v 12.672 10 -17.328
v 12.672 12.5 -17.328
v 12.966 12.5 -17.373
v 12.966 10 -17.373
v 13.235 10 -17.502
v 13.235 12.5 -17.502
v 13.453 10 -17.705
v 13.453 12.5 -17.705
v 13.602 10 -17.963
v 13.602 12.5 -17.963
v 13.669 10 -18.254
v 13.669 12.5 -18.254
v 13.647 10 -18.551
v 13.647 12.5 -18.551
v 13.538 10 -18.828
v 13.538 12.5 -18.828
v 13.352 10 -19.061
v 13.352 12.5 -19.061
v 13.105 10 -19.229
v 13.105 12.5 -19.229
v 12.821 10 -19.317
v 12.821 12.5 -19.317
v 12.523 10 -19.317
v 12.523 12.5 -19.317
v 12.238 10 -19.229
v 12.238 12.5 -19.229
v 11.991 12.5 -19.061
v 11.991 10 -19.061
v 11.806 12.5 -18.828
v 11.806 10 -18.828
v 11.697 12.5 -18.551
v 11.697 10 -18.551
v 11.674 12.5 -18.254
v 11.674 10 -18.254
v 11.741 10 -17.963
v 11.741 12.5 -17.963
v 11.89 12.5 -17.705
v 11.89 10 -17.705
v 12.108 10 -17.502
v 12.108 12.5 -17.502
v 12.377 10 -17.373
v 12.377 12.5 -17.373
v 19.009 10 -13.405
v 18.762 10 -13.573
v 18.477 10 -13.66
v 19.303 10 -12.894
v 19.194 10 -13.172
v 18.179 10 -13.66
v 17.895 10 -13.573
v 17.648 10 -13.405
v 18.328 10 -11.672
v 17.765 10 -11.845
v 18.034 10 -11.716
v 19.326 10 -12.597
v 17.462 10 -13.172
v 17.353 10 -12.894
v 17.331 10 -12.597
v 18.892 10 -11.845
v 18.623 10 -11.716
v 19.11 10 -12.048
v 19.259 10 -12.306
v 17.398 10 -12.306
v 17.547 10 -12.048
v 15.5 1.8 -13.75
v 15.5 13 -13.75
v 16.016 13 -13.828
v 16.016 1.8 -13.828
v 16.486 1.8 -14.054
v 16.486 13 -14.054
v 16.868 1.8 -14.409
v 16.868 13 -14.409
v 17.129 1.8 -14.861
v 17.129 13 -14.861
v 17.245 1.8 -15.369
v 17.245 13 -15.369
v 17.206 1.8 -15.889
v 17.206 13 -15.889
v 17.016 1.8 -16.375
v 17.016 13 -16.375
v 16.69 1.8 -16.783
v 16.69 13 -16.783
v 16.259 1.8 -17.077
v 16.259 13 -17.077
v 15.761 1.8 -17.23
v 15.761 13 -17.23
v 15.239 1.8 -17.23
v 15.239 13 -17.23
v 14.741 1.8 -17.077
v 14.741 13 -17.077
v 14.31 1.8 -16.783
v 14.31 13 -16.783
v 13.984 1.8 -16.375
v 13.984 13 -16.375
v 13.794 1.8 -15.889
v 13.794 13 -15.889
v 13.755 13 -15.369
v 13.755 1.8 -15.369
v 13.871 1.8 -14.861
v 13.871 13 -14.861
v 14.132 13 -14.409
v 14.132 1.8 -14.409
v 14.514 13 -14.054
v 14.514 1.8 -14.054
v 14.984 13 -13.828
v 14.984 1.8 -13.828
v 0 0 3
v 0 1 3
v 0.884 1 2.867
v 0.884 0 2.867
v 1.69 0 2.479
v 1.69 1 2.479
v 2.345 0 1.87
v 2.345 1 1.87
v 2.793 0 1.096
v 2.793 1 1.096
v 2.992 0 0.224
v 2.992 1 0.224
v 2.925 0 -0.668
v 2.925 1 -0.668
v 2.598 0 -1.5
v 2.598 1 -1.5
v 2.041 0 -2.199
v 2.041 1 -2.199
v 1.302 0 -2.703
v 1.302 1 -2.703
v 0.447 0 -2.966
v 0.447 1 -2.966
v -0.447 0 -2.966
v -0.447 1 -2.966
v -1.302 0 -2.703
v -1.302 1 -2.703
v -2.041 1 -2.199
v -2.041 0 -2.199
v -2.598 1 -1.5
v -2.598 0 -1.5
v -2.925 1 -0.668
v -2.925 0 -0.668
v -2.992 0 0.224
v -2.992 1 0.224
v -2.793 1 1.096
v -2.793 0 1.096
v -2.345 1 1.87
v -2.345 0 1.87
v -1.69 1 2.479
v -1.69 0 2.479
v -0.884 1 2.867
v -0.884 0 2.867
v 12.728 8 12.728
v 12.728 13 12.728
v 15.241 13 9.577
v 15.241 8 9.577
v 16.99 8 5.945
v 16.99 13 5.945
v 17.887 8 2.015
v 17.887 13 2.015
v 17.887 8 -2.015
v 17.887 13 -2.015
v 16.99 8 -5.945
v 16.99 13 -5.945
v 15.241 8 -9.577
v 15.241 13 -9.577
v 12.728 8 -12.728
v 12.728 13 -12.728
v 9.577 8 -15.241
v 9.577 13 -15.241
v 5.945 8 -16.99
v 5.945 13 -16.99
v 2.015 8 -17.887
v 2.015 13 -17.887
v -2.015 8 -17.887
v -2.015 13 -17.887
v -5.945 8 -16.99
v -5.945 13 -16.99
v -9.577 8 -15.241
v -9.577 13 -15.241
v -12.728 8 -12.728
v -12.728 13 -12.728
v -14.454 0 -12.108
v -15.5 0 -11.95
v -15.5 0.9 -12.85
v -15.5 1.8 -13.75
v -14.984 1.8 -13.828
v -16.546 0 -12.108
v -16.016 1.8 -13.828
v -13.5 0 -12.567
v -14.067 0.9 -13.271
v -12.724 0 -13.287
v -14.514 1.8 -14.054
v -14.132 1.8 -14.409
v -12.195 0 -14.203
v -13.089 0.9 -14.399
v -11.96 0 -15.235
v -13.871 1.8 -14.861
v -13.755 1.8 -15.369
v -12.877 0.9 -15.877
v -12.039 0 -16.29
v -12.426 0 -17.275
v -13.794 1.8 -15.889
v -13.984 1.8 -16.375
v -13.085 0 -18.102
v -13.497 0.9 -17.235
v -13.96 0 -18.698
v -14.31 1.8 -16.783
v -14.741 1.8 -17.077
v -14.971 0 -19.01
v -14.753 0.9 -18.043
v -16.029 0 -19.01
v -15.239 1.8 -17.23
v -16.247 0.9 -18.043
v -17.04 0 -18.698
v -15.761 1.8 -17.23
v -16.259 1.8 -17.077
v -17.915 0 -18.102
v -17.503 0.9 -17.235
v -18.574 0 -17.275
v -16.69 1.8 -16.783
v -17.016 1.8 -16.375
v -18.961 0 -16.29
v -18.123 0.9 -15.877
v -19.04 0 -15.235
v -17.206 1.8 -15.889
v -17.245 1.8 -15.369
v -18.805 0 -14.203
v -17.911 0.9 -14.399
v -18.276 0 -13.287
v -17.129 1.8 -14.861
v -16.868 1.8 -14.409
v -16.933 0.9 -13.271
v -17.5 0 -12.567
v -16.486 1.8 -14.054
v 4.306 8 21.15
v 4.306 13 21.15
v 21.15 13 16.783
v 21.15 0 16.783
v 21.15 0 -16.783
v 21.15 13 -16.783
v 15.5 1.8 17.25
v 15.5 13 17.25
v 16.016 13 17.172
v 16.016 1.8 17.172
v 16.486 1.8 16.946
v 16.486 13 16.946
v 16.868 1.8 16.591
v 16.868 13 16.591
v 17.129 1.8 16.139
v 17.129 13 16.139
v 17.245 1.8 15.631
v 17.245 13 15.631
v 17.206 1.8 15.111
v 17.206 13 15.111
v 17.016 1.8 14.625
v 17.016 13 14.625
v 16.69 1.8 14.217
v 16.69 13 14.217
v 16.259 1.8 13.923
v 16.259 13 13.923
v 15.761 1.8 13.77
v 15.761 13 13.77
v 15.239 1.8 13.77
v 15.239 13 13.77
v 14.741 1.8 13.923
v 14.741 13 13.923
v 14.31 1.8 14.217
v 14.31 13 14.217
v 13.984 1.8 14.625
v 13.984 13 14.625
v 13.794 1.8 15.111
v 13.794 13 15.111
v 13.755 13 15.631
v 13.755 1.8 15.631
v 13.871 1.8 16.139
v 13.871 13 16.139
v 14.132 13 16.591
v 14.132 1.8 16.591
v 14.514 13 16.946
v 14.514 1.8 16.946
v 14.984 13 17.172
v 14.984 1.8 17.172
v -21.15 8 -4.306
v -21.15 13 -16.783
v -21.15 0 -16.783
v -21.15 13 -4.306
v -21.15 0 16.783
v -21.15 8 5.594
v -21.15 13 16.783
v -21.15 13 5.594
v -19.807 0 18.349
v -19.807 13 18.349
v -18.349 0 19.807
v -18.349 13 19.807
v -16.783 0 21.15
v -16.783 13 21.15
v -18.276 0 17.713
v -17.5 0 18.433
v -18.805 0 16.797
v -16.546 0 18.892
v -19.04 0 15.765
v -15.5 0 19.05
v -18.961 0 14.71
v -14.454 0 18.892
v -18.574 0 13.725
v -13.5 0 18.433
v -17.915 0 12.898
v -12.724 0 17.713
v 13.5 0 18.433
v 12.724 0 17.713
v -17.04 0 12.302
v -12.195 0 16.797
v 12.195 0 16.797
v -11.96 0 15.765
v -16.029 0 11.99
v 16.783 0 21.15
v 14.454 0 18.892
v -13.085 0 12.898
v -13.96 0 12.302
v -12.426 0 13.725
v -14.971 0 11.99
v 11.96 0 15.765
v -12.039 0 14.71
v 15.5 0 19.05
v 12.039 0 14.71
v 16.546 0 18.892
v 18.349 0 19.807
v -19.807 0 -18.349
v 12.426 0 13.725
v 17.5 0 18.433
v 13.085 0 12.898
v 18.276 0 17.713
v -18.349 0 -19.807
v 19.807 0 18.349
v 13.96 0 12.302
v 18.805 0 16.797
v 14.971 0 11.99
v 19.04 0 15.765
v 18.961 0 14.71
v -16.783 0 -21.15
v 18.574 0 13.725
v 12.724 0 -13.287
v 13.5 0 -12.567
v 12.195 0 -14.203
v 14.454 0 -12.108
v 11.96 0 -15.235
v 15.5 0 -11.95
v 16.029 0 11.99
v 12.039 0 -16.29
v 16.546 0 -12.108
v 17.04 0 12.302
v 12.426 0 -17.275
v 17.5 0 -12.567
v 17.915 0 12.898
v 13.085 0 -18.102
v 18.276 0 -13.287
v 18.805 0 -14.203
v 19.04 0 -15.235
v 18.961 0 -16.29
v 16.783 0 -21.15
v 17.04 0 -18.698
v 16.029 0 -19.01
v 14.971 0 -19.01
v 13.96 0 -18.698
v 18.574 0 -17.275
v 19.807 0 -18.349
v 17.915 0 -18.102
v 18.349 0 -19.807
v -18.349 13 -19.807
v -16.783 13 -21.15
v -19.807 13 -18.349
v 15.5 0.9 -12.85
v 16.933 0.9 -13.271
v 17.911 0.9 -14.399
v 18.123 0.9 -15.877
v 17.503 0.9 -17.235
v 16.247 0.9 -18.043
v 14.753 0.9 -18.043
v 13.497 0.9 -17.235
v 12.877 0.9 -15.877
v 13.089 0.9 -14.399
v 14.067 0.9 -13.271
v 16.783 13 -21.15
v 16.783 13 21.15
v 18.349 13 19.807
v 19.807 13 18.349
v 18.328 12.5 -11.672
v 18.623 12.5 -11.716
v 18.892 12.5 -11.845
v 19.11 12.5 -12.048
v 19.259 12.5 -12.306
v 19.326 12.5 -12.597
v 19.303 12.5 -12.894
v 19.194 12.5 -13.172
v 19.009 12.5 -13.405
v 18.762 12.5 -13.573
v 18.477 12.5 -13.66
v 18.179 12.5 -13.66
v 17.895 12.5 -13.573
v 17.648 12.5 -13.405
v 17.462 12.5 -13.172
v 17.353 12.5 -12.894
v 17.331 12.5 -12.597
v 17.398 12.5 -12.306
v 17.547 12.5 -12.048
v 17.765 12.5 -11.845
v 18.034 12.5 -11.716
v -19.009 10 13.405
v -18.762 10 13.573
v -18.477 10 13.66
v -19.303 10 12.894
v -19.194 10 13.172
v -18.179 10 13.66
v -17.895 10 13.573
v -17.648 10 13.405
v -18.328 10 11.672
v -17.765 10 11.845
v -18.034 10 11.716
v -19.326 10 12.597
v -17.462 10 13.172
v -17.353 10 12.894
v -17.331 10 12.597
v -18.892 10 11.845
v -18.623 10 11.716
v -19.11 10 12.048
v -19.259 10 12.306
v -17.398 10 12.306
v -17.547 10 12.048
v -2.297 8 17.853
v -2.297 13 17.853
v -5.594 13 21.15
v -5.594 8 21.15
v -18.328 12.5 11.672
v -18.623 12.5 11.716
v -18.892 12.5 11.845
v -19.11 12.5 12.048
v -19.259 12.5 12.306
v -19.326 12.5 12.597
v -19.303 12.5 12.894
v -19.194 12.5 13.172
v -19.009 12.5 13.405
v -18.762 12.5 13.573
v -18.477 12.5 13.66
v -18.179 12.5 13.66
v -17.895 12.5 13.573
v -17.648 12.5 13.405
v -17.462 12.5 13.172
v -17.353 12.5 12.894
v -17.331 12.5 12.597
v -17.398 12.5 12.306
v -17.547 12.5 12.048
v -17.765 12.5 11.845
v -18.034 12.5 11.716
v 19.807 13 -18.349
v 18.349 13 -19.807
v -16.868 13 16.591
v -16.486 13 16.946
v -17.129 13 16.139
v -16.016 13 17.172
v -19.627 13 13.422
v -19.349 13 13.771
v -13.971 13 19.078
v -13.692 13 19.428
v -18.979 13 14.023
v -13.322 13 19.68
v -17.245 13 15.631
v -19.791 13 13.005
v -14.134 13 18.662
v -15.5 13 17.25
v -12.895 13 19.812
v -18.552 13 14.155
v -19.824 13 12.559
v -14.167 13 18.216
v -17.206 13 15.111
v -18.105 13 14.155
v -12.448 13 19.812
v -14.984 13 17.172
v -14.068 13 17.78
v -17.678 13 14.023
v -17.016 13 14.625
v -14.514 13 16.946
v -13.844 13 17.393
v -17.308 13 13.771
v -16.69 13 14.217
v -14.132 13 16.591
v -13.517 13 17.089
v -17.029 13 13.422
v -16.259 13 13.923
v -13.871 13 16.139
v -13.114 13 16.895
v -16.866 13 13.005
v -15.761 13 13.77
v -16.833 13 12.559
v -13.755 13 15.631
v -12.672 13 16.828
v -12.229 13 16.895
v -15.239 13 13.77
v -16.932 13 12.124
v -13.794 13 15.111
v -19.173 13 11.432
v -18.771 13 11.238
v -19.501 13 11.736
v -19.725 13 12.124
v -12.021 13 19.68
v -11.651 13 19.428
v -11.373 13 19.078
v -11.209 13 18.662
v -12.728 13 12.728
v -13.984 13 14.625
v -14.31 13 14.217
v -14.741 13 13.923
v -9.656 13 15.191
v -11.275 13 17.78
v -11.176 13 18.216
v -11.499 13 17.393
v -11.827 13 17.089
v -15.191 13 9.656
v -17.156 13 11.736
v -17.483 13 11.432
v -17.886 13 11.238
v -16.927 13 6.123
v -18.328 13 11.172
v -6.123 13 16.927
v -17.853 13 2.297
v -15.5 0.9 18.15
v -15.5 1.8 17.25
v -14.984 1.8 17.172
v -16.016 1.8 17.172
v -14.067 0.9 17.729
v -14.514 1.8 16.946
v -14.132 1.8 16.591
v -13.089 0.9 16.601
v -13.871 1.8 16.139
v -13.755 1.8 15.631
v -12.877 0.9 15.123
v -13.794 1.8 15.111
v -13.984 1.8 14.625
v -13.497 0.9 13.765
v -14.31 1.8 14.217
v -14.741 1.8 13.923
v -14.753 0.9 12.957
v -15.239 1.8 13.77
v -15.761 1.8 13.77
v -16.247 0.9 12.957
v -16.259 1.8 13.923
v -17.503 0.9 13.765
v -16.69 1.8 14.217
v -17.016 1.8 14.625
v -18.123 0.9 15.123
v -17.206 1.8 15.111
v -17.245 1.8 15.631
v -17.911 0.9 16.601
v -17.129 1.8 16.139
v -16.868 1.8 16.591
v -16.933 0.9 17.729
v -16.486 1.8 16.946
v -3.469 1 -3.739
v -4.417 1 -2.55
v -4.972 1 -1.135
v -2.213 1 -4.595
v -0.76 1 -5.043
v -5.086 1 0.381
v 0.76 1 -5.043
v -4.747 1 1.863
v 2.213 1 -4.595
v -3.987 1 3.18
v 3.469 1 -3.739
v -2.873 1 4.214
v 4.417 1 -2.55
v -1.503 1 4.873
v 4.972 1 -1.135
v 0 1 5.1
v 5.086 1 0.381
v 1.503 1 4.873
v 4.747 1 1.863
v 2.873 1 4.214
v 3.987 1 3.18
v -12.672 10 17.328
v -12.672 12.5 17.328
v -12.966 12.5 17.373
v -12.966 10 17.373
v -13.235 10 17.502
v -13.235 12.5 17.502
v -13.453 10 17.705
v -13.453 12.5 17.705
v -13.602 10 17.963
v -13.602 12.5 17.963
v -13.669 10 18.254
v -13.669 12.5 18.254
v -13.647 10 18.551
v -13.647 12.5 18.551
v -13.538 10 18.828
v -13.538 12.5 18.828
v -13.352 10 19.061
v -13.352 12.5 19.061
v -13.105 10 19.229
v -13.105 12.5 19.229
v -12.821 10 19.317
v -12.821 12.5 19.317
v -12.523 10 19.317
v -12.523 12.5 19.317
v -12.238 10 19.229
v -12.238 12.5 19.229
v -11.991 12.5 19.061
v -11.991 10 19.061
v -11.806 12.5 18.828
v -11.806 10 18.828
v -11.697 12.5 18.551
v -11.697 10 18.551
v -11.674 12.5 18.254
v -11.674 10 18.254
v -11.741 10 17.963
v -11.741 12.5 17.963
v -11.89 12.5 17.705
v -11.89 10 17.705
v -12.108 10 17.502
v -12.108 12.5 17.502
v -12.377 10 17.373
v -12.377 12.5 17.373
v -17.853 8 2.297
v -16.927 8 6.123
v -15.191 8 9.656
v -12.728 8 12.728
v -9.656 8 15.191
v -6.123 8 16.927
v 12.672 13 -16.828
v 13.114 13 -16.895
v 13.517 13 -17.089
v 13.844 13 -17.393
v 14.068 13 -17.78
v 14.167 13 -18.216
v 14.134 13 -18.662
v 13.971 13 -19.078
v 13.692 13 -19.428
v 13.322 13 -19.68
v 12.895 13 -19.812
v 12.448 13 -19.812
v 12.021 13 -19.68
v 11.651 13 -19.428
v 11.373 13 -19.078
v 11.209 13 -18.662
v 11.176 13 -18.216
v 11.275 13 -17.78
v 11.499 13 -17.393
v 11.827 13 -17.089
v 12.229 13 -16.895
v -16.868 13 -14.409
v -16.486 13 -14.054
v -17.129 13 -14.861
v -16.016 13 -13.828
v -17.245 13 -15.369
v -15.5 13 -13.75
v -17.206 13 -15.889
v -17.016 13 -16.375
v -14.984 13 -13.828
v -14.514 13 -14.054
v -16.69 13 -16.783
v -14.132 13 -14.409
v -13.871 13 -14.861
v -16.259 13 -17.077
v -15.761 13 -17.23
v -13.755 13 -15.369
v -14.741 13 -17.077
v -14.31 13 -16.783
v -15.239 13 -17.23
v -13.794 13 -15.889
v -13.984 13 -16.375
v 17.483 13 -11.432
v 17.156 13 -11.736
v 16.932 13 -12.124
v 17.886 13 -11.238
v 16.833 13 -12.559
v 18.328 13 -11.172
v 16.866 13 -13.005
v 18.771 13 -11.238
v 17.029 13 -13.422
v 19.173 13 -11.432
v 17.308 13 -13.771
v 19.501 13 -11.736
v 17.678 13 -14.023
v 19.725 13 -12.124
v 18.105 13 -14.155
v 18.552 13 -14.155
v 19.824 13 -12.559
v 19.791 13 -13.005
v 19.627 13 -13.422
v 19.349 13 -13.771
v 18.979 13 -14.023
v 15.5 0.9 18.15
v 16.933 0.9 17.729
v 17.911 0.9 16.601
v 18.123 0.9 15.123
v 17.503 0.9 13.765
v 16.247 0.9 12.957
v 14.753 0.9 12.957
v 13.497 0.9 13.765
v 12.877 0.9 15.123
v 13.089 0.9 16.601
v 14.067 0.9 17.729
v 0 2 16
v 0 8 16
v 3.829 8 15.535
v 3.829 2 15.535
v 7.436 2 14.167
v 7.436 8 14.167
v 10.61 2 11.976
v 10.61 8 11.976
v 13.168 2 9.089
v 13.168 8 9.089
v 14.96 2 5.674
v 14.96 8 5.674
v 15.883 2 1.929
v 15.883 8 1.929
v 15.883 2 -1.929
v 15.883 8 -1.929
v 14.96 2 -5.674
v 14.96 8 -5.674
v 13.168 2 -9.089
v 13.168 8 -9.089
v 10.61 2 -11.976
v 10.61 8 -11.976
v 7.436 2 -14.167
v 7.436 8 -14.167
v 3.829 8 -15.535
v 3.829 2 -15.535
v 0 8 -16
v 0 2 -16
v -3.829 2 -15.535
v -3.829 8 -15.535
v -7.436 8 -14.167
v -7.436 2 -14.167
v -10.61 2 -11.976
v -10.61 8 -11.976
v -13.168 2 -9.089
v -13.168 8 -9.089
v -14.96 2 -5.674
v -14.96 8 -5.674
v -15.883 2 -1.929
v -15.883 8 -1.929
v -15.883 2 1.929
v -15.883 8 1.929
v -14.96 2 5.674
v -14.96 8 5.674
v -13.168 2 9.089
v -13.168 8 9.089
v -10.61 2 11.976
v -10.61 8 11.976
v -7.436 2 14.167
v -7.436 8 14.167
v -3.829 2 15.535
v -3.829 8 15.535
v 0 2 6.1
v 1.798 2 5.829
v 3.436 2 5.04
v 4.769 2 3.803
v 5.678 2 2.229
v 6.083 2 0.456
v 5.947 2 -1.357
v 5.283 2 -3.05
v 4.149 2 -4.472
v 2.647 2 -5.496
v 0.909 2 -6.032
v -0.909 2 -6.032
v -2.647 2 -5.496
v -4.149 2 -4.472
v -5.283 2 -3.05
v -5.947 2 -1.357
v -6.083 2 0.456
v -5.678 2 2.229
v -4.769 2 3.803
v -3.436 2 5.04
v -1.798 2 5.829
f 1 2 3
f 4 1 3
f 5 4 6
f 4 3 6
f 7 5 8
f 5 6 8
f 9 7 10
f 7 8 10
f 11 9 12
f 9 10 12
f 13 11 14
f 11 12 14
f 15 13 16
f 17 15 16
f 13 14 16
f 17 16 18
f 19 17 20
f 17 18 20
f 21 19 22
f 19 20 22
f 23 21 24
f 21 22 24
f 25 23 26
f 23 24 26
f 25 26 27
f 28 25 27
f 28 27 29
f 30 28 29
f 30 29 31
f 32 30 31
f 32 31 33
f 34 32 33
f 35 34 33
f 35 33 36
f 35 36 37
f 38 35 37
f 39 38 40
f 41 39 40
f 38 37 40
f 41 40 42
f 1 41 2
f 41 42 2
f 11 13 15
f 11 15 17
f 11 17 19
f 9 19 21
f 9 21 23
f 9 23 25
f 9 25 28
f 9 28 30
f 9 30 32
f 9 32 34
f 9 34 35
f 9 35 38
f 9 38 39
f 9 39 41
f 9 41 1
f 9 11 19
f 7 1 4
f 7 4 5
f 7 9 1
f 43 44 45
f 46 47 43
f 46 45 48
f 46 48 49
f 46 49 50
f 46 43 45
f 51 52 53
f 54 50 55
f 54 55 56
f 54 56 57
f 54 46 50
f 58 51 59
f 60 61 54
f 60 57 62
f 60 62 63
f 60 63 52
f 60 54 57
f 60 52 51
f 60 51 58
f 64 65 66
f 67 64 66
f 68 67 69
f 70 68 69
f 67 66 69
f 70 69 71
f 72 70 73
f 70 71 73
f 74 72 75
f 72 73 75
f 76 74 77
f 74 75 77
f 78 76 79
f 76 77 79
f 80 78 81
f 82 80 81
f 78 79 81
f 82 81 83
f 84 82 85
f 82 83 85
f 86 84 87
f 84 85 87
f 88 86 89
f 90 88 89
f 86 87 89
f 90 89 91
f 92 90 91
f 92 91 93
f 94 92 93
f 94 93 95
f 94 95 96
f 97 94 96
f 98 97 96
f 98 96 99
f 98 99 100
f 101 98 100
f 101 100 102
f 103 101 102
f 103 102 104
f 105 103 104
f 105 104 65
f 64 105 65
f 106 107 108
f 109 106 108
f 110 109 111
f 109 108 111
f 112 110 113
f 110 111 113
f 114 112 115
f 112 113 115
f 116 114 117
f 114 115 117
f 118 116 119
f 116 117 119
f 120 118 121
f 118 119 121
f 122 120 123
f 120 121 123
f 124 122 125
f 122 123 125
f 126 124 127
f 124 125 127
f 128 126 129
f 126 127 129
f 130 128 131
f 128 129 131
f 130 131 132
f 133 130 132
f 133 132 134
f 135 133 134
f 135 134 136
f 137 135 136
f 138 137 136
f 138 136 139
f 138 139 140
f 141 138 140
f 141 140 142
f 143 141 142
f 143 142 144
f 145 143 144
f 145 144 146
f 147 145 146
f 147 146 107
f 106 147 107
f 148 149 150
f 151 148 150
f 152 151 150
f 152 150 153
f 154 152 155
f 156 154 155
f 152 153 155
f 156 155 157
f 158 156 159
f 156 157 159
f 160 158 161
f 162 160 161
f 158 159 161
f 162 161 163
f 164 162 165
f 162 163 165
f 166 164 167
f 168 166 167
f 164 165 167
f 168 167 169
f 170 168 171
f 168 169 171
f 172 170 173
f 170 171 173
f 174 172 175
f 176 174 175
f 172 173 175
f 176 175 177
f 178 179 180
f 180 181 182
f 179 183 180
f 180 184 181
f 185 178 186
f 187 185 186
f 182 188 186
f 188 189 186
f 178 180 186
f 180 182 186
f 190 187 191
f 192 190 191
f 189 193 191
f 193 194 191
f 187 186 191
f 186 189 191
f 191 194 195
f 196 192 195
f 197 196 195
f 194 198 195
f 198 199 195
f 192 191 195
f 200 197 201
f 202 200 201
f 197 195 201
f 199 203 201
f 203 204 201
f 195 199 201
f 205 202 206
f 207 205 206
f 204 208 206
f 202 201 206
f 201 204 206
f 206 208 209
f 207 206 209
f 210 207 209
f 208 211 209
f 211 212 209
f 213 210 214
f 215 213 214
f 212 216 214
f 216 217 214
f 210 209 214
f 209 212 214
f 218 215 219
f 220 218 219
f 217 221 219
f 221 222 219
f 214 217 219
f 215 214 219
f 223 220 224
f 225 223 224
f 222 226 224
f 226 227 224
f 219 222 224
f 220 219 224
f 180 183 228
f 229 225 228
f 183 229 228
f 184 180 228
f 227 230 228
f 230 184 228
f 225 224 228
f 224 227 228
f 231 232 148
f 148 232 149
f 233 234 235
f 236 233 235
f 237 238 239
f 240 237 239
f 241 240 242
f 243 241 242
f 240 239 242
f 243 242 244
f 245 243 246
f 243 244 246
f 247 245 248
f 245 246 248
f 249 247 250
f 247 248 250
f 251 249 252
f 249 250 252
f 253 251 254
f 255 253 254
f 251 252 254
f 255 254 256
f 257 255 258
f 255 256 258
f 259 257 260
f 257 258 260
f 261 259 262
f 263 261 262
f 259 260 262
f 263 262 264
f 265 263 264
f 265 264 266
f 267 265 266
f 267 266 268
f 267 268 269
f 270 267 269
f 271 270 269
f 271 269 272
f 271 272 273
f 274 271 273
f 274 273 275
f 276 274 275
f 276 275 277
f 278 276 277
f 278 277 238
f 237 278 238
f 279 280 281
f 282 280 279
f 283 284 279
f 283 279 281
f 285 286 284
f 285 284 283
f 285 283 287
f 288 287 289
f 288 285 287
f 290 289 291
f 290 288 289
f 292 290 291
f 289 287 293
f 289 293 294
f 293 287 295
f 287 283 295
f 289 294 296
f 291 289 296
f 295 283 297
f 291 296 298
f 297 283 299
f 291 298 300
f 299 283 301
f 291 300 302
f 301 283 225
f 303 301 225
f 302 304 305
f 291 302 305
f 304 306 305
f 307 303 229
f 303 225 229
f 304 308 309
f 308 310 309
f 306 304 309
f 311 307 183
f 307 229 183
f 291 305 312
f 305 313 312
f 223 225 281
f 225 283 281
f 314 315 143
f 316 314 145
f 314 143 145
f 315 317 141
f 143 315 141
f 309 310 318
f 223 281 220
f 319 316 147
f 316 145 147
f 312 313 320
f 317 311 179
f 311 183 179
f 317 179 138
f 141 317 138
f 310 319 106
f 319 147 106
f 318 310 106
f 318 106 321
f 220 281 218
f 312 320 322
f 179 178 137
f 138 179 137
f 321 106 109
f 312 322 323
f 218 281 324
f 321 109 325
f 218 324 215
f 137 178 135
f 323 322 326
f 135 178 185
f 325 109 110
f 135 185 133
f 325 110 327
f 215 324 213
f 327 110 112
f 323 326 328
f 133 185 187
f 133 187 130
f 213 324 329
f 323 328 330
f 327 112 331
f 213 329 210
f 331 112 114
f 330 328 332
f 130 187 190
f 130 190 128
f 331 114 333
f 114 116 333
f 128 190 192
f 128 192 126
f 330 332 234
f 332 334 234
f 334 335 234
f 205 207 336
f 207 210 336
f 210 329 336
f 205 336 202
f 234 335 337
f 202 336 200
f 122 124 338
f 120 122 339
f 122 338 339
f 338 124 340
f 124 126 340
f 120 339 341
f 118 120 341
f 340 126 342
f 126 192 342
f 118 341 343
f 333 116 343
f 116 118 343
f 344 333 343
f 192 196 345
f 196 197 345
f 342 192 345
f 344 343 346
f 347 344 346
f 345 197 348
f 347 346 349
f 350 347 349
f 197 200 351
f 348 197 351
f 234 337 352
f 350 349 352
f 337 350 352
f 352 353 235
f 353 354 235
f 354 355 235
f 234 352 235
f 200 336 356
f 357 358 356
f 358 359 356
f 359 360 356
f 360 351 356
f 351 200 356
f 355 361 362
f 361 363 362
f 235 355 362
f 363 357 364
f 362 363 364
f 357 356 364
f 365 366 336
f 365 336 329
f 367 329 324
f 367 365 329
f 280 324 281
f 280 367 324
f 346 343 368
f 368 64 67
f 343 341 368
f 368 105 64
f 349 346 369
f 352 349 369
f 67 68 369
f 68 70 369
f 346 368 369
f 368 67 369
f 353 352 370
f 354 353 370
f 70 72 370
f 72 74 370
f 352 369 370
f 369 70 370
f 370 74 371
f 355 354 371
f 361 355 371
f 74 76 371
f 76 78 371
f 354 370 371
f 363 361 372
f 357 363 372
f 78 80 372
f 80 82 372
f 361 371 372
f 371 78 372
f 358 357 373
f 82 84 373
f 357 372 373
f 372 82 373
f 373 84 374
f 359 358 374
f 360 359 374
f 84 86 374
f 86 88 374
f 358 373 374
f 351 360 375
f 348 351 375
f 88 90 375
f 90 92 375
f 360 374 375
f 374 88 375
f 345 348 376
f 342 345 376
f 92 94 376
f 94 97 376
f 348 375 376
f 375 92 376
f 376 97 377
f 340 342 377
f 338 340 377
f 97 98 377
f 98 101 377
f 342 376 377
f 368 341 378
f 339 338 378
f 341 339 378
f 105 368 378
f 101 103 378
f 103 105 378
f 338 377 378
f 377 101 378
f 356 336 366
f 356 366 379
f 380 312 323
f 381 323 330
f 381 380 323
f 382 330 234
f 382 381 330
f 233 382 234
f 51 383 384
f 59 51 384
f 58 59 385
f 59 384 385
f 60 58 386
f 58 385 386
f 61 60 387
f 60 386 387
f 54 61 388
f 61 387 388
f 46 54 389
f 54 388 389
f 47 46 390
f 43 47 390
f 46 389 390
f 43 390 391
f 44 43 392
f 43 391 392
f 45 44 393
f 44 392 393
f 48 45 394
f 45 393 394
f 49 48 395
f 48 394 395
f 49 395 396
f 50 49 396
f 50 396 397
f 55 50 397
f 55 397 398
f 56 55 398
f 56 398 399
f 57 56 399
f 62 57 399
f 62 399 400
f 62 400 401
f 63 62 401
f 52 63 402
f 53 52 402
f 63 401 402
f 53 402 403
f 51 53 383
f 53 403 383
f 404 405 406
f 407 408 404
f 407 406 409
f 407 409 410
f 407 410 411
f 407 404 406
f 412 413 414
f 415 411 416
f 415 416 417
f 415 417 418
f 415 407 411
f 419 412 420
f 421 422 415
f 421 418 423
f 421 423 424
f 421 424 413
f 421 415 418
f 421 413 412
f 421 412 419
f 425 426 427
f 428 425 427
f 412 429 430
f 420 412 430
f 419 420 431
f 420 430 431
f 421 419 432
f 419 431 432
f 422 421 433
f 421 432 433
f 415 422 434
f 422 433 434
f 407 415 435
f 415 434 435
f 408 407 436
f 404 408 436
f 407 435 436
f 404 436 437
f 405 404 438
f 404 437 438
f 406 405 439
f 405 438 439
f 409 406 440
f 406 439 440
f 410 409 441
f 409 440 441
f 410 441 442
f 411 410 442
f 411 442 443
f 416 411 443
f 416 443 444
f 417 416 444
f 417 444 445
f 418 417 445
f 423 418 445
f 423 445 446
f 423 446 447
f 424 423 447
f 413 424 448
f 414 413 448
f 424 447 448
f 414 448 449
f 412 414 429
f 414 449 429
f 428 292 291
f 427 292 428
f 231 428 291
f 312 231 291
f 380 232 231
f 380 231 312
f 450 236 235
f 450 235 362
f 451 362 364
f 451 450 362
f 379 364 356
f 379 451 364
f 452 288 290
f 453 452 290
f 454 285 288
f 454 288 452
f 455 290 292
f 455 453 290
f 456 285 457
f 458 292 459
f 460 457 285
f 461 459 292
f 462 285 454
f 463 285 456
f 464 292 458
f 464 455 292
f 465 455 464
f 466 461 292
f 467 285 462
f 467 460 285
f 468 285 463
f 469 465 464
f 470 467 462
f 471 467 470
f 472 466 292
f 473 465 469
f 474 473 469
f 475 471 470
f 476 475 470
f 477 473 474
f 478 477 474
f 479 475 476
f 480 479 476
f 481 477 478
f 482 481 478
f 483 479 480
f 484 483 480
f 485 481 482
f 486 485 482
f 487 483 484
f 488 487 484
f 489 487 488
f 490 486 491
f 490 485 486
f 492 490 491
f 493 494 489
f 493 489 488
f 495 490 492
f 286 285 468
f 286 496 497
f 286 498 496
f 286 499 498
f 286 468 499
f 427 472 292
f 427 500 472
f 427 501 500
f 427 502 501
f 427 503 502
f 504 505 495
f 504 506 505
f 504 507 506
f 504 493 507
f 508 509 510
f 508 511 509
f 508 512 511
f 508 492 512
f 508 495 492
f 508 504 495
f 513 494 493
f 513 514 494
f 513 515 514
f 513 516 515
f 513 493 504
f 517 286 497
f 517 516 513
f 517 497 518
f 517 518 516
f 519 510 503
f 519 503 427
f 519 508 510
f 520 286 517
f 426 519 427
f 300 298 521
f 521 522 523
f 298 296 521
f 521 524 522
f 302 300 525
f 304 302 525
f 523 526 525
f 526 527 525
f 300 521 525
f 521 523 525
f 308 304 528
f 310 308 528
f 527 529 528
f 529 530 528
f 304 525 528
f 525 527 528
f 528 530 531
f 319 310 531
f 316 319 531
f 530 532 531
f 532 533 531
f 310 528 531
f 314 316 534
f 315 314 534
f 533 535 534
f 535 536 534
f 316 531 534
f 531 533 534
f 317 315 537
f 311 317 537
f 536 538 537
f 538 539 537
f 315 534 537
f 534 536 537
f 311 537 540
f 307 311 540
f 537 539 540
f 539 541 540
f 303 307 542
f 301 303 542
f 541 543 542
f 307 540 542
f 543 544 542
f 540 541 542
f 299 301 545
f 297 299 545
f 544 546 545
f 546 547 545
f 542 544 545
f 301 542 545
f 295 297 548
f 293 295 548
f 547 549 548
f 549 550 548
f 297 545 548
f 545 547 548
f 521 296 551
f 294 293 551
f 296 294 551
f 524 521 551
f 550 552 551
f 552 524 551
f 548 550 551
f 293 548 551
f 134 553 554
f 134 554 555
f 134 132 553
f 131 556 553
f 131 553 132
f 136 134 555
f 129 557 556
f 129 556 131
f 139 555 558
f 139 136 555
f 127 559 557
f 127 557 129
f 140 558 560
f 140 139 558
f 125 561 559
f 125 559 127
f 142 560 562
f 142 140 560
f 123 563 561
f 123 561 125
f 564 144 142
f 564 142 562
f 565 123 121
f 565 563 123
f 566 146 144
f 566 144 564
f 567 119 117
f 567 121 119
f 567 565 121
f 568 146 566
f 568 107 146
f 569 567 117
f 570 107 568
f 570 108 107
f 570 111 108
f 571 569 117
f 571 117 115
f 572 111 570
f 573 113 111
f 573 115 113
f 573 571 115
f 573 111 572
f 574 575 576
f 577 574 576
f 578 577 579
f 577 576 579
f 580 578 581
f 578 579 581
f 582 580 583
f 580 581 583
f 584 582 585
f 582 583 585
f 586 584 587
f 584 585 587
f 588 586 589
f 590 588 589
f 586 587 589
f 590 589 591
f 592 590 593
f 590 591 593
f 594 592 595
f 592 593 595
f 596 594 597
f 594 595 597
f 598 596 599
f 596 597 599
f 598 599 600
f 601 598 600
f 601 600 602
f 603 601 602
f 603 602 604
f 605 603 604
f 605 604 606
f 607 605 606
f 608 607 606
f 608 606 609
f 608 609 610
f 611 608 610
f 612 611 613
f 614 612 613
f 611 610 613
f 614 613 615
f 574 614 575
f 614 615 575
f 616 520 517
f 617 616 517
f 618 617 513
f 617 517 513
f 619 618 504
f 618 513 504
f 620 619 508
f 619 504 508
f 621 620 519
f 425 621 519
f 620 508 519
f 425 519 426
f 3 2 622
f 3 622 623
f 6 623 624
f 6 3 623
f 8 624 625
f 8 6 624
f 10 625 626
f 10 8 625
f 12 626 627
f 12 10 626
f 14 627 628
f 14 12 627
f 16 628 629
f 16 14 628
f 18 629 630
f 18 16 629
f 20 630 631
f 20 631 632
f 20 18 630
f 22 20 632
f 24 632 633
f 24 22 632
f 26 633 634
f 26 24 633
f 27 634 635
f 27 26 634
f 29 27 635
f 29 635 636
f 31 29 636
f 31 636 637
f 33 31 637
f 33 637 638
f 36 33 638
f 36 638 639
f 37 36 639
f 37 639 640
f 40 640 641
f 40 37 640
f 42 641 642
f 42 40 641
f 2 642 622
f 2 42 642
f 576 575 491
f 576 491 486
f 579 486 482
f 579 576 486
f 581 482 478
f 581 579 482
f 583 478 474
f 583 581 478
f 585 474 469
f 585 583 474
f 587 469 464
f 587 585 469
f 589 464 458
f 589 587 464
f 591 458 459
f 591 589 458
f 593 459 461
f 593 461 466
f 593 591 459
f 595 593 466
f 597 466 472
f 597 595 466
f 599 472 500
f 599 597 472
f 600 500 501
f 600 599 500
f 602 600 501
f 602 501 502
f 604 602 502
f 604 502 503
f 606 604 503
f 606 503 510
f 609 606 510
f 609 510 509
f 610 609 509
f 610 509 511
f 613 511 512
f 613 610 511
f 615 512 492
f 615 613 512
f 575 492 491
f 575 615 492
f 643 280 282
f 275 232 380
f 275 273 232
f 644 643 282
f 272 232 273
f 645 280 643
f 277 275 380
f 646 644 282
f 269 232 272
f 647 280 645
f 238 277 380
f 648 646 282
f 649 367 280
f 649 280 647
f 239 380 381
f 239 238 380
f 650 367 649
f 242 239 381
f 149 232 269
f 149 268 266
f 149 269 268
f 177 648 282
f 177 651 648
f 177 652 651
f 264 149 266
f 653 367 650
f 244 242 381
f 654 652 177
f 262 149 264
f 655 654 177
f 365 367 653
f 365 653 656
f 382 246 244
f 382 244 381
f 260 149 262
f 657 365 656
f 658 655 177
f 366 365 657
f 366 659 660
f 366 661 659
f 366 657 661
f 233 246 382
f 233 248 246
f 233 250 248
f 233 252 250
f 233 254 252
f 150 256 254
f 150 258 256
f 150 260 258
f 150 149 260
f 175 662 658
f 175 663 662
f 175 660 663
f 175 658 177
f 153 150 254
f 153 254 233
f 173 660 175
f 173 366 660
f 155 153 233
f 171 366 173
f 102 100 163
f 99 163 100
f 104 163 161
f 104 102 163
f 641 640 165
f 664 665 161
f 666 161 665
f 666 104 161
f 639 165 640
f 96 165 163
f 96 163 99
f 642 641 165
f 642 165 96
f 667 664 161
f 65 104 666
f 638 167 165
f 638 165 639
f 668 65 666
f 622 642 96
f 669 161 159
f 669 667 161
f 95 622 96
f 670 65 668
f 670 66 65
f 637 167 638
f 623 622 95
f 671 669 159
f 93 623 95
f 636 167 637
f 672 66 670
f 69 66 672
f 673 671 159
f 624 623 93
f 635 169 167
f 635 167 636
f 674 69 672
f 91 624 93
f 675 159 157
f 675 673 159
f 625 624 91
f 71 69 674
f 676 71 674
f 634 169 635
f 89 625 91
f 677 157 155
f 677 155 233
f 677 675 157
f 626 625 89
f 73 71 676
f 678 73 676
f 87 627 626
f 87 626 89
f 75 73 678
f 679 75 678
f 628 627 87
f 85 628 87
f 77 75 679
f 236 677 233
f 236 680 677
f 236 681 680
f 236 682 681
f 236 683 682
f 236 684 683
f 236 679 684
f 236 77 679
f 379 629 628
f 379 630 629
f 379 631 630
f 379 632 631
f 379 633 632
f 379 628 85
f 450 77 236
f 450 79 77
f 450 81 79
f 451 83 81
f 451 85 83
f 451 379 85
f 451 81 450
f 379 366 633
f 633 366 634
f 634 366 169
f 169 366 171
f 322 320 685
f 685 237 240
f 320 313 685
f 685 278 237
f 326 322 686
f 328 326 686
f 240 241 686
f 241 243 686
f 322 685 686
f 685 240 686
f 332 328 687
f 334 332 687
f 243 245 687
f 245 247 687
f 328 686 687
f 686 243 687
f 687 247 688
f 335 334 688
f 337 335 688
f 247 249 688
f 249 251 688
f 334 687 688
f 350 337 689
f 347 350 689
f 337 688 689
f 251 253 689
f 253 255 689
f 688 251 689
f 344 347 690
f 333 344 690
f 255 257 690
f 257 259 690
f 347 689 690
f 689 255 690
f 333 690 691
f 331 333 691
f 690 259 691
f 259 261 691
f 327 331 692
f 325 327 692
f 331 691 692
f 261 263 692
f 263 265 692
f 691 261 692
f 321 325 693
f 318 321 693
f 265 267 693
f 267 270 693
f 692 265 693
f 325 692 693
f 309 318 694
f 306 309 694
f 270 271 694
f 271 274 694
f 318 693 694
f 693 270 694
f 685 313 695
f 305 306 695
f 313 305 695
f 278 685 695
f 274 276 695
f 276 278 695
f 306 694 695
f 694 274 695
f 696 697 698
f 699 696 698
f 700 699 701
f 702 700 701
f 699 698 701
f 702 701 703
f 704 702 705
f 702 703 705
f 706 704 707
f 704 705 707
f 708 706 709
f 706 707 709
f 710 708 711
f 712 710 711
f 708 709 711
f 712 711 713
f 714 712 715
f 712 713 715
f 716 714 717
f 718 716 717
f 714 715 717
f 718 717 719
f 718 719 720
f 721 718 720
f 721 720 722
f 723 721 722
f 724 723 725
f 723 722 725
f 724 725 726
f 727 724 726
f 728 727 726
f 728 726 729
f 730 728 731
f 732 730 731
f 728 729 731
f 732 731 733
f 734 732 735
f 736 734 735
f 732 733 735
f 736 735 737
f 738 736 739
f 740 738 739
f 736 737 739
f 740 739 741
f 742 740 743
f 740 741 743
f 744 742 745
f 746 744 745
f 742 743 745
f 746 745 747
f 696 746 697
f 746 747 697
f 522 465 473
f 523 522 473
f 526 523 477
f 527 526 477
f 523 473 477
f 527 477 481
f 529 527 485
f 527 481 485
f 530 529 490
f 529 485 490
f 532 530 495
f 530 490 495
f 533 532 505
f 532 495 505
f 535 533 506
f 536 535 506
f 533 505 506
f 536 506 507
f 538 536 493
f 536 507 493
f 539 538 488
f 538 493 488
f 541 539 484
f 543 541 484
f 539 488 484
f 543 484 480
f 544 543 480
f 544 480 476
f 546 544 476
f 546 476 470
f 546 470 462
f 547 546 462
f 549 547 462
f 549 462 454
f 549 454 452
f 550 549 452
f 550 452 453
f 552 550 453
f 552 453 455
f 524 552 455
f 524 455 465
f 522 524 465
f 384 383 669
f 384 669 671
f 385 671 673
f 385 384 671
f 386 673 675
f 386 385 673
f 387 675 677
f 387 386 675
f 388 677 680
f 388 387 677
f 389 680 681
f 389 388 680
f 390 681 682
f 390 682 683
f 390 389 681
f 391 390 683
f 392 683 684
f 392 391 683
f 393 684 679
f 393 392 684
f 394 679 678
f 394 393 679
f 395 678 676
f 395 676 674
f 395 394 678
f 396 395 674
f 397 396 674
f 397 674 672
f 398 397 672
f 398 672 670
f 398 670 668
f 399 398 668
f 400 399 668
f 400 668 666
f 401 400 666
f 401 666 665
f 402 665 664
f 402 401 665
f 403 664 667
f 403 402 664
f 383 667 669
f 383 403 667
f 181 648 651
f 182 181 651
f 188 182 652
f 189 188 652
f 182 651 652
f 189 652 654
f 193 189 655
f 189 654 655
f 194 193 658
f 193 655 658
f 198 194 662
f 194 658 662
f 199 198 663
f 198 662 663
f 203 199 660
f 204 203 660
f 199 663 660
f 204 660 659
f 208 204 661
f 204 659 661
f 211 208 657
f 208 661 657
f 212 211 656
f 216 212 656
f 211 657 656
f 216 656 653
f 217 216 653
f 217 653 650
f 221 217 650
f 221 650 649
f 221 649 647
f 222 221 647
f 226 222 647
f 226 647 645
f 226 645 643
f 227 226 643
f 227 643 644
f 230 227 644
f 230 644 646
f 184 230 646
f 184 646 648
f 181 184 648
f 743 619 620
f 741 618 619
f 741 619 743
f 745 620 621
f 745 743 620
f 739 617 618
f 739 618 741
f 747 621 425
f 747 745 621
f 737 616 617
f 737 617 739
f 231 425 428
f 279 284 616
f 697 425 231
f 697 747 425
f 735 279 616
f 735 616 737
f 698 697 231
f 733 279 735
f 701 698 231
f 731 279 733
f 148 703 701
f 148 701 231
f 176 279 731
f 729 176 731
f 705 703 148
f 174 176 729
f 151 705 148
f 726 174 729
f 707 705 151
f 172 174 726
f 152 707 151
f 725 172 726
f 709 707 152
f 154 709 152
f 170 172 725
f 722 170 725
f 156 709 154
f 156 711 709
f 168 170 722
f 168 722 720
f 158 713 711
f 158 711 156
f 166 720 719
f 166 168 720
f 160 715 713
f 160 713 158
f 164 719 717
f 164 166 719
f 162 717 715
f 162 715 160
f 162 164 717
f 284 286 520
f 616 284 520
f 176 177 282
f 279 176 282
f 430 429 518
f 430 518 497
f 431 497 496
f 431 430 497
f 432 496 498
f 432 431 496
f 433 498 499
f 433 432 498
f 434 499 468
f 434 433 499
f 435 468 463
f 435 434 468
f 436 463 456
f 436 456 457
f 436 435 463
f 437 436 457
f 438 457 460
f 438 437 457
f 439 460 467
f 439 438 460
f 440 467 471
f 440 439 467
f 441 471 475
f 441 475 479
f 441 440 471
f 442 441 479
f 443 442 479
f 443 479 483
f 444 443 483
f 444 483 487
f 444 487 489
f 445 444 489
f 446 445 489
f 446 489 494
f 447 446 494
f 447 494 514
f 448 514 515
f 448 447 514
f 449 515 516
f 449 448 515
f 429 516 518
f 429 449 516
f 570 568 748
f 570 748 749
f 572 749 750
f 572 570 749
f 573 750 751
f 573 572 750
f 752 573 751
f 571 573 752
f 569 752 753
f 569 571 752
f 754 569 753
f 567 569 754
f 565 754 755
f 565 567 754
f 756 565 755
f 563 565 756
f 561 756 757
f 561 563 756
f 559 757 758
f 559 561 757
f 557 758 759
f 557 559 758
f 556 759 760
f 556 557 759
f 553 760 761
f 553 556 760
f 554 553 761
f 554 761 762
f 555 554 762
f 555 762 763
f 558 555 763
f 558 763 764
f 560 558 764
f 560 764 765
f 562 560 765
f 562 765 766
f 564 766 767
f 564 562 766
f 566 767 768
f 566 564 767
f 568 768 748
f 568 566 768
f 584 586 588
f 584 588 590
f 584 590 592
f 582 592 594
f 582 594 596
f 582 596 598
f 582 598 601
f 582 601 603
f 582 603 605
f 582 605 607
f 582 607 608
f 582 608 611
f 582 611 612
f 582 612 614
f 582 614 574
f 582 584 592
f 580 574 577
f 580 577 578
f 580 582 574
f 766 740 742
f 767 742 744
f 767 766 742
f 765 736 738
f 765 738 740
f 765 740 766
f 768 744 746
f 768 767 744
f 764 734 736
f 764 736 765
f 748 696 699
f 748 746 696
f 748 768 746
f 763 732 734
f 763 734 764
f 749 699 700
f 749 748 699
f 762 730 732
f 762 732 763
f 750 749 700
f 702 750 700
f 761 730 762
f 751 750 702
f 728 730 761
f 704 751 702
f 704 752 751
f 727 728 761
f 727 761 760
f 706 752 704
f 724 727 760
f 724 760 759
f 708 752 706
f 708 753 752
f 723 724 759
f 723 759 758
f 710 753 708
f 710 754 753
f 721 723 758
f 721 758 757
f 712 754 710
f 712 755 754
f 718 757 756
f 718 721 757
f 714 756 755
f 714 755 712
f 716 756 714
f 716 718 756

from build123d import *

# Parameters (mm, degrees)
SKETCH2_W           = 42.3
SKETCH2_H           = 42.3
BOSS_EXTRUDE1_DEPTH = 13
SKETCH3_R           = 3
CUT_EXTRUDE1_DEPTH  = 33.613570795
SKETCH4_R           = 1.75
CUT_EXTRUDE2_DEPTH  = 33.613570795
SKETCH5_R           = 29.910616844
SKETCH5_R_2         = 27
CUT_EXTRUDE4_DEPTH  = 33.613570795
SKETCH6_R           = 3
CUT_EXTRUDE5_DEPTH  = 11
CHAMFER1_SIZE       = 1.8
SKETCH7_R           = 5.1
CUT_EXTRUDE6_DEPTH  = 1
BOSS_EXTRUDE2_START = 6
SKETCH8_R           = 16
BOSS_EXTRUDE2_DEPTH = 6
CHAMFER2_SIZE       = 1
SKETCH9_R           = 1
CUT_EXTRUDE7_DEPTH  = 3
CHAMFER3_SIZE       = 0.5


with BuildPart() as part:
    # Sketch2 → Boss-Extrude1 (new body)
    with BuildSketch(Plane(origin=(0, 0, 0), x_dir=(1, 0, 0), z_dir=(0, 1, 0))):
        Rectangle(SKETCH2_W, SKETCH2_H)
    extrude(amount=BOSS_EXTRUDE1_DEPTH)

    # Sketch3 → Cut-Extrude1 (cut, through all)
    with BuildSketch(Plane(origin=(0, 13, 0), x_dir=(1, 0, 0), z_dir=(0, 1, 0))):
        with Locations(Location((0, 0, 0), (0, 0, 270))):
            Circle(SKETCH3_R)
    extrude(amount=-CUT_EXTRUDE1_DEPTH, mode=Mode.SUBTRACT)

    # Sketch4 → Cut-Extrude2 (cut, through all)
    with BuildSketch(Plane(origin=(0, 13, 0), x_dir=(1, 0, 0), z_dir=(0, 1, 0))):
        with Locations(Location((-15.5, 15.5, 0), (0, 0, 270))):
            Circle(SKETCH4_R)
        with Locations(Location((15.5, 15.5, 0), (0, 0, 270))):
            Circle(SKETCH4_R)
        with Locations(Location((15.5, -15.5, 0), (0, 0, 270))):
            Circle(SKETCH4_R)
        with Locations(Location((-15.5, -15.5, 0), (0, 0, 270))):
            Circle(SKETCH4_R)
    extrude(amount=-CUT_EXTRUDE2_DEPTH, mode=Mode.SUBTRACT)

    # Sketch5 → Cut-Extrude4 (cut, through all)
    with BuildSketch(Plane(origin=(0, 13, 0), x_dir=(1, 0, 0), z_dir=(0, 1, 0))):
        Circle(SKETCH5_R)
        Circle(SKETCH5_R_2, mode=Mode.SUBTRACT)
    extrude(amount=-CUT_EXTRUDE4_DEPTH, mode=Mode.SUBTRACT)

    # Sketch6 → Cut-Extrude5 (cut)
    with BuildSketch(Plane(origin=(0, 13, 0), x_dir=(1, 0, 0), z_dir=(0, 1, 0))):
        with BuildLine():
            Line((-12.727922061, 12.727922061), (-21.15, 4.305844123))
            Line((-21.15, 4.305844123), (-21.15, -5.593650814))
            Line((-21.15, -5.593650814), (-17.852895433, -2.296546247))
            ThreePointArc((-17.852895433, -2.296546247), (-12.727922061, -12.727922061), (-2.296546247, -17.852895433))
            Line((-2.296546247, -17.852895433), (-5.593650814, -21.15))
            Line((-5.593650814, -21.15), (4.305844123, -21.15))
            Line((4.305844123, -21.15), (12.727922061, -12.727922061))
            ThreePointArc((12.727922061, -12.727922061), (12.727922061, 12.727922061), (-12.727922061, 12.727922061))
        make_face()
        with Locations(Location((0, 0, 0), (0, 0, 270))):
            Circle(SKETCH6_R, mode=Mode.SUBTRACT)
    extrude(amount=-CUT_EXTRUDE5_DEPTH, mode=Mode.SUBTRACT)

    # Chamfer1
    chamfer1_edges = [part.edges().sort_by_distance(p)[0] for p in [
        (-15.5, 0, 13.75),
        (15.5, 0, 13.75),
        (15.5, 0, -17.25),
        (-15.5, 0, -17.25),
    ]]
    chamfer(chamfer1_edges, length=CHAMFER1_SIZE)

    # Sketch7 → Cut-Extrude6 (cut)
    with BuildSketch(Plane(origin=(0, 2, 0), x_dir=(1, 0, 0), z_dir=(0, 1, 0))):
        with Locations(Location((0, 0, 0), (0, 0, 270))):
            Circle(SKETCH7_R)
    extrude(amount=-CUT_EXTRUDE6_DEPTH, mode=Mode.SUBTRACT)

    # Sketch8 → Boss-Extrude2 (add)
    with BuildSketch(Plane(origin=(0, 2, 0), x_dir=(1, 0, 0), z_dir=(0, 1, 0)).offset(BOSS_EXTRUDE2_START)):
        with BuildLine():
            Line((-21.15, 4.305844123), (-21.15, -5.593650814))
            Line((-21.15, -5.593650814), (-17.852895433, -2.296546247))
            ThreePointArc((-17.852895433, -2.296546247), (-12.727922061, -12.727922061), (-2.296546247, -17.852895433))
            Line((-2.296546247, -17.852895433), (-5.593650814, -21.15))
            Line((-5.593650814, -21.15), (4.305844123, -21.15))
            Line((4.305844123, -21.15), (12.727922061, -12.727922061))
            ThreePointArc((12.727922061, -12.727922061), (12.727922061, 12.727922061), (-12.727922061, 12.727922061))
            Line((-12.727922061, 12.727922061), (-21.15, 4.305844123))
        make_face()
        with Locations(Location((0, 0, 0), (0, 0, 270))):
            Circle(SKETCH8_R, mode=Mode.SUBTRACT)
    extrude(amount=-BOSS_EXTRUDE2_DEPTH)

    # Chamfer2
    chamfer2_edges = [part.edges().sort_by_distance(p)[0] for p in [
        (0, 2, -5.1),
    ]]
    chamfer(chamfer2_edges, length=CHAMFER2_SIZE - 0.0001)  # a hair under: the kernel refuses the full size

    # Sketch9 → Cut-Extrude7 (cut)
    with BuildSketch(Plane(origin=(0, 13, 0), x_dir=(1, 0, 0), z_dir=(0, 1, 0))):
        with Locations(Location((12.671572875, 18.328427125, 0), (0, 0, 270))):
            Circle(SKETCH9_R)
        with Locations(Location((18.328427125, 12.671572875, 0), (0, 0, 270))):
            Circle(SKETCH9_R)
        with Locations(Location((-12.671572875, -18.328427125, 0), (0, 0, 90))):
            Circle(SKETCH9_R)
        with Locations(Location((-18.328427125, -12.671572875, 0), (0, 0, 90))):
            Circle(SKETCH9_R)
    extrude(amount=-CUT_EXTRUDE7_DEPTH, mode=Mode.SUBTRACT)

    # Chamfer3
    chamfer3_edges = [part.edges().sort_by_distance(p)[0] for p in [
        (18.328427125, 13, -13.671572875),
        (12.671572875, 13, -19.328427125),
        (-12.671572875, 13, 19.328427125),
        (-18.328427125, 13, 13.671572875),
    ]]
    chamfer(chamfer3_edges, length=CHAMFER3_SIZE)


solid = part.part
